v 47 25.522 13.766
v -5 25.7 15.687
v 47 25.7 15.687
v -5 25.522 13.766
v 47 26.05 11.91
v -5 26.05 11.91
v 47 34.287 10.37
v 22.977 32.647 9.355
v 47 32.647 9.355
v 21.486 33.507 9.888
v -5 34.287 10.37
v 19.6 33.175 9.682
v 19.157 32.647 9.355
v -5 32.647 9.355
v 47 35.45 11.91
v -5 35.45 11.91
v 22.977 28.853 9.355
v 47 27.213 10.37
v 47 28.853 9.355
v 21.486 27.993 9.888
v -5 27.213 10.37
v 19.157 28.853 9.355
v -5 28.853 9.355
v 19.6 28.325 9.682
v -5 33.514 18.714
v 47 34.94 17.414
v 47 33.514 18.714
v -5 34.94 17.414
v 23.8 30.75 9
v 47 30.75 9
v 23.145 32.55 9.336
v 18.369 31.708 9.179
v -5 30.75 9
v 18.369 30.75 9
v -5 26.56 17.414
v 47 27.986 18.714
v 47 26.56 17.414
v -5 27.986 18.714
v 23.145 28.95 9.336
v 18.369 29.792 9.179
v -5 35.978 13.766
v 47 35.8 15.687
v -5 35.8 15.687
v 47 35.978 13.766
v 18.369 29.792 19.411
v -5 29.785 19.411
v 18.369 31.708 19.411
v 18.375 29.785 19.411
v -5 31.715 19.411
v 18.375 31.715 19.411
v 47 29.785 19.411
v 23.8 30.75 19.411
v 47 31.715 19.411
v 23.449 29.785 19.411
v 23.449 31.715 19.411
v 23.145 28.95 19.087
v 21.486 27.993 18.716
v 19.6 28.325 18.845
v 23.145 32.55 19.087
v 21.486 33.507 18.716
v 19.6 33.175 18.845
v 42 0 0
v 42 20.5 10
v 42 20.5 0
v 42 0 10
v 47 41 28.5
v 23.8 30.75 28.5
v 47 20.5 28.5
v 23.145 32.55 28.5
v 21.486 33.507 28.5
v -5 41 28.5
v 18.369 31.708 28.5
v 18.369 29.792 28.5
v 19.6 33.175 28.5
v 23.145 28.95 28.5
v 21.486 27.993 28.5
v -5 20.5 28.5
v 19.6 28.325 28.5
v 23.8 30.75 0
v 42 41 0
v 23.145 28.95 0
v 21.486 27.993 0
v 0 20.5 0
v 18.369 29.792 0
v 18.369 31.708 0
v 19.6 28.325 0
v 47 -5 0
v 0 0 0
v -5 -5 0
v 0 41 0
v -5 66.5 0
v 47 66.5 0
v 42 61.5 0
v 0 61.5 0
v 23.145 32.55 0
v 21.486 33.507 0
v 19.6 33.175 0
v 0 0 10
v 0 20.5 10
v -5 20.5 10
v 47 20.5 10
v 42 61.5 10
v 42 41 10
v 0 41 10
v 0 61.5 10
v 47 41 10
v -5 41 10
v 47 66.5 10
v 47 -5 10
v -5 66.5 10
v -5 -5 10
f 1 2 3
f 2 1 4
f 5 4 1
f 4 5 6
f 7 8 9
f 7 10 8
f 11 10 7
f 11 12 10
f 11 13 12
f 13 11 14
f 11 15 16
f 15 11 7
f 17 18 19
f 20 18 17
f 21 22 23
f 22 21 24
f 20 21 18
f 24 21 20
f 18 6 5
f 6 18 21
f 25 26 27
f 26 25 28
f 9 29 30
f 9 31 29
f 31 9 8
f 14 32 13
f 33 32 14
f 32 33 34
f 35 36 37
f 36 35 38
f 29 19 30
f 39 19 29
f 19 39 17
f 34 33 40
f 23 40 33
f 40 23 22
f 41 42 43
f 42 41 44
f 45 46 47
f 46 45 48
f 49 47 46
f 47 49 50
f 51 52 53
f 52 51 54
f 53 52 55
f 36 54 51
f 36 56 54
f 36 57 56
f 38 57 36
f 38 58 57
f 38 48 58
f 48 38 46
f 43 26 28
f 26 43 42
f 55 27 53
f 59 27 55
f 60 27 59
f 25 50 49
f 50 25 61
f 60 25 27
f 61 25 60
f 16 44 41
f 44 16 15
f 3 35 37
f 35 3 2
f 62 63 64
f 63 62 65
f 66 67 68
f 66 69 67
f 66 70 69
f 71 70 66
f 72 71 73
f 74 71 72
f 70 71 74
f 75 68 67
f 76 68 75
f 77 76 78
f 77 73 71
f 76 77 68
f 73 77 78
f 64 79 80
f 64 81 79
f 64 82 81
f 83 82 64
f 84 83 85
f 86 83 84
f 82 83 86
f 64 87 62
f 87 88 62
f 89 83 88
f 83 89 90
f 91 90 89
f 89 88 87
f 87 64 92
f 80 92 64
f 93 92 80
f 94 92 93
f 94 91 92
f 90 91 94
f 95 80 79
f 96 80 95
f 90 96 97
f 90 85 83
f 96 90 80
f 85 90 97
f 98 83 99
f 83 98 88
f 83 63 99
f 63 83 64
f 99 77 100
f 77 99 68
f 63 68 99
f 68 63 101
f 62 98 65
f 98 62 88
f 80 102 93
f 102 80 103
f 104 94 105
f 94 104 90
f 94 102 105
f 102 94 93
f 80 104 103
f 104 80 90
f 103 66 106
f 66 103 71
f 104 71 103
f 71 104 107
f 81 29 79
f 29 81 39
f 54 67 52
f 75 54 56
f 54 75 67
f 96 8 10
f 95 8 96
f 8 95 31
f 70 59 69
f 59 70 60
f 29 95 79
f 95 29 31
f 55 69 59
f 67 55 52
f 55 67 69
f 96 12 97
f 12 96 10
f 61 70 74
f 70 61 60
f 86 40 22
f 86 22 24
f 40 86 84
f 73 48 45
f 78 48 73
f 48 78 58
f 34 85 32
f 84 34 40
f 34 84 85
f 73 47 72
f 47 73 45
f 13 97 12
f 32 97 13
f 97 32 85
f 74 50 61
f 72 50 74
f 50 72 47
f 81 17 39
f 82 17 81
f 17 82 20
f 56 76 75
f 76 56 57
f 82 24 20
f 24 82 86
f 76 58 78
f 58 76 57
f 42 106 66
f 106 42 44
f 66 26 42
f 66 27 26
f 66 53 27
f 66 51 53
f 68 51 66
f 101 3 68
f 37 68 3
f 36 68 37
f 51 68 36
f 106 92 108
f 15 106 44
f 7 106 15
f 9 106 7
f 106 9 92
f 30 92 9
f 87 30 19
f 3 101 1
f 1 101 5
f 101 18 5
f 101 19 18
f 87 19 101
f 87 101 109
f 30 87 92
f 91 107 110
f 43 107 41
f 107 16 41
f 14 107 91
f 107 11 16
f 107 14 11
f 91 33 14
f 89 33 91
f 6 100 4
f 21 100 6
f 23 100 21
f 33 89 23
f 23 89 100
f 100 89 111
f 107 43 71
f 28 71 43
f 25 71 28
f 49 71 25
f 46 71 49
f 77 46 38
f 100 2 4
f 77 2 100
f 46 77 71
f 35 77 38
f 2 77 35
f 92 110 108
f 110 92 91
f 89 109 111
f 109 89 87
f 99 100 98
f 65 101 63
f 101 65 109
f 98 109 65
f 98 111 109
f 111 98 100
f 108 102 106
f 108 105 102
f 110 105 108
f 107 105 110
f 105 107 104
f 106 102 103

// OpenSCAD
//-- Servo Tray for Carbon Fibre Rod
//-- Mrhamer.com
//-- GPL V3
servowidth= 20.5 ;
servoheight= 28.5 ;
servolength= 42 ;
fuselog = 10.5 ; 
internalbuffer =  5;
outsidebuffer = 5;
gap = servowidth + fuselog;

//Bracket


difference(){
translate([-outsidebuffer,-outsidebuffer,0])cube([servolength+outsidebuffer+outsidebuffer, servowidth+internalbuffer+fuselog+internalbuffer+servowidth+outsidebuffer+outsidebuffer, servoheight]);

//Removal
union(){
translate([0, servowidth + internalbuffer + (fuselog/2),servoheight/2])translate([-20,0,0])rotate(90,[0,1,0])cylinder(r=fuselog/2, h=servolength+50);
cube([42,servowidth,28.5]) ;
translate([0,gap+internalbuffer+internalbuffer,0])cube([42,servowidth,28.5]) ;
translate([servolength/2, servowidth + internalbuffer + (fuselog/2),-11])cylinder(r=2.8, 50);}
translate([-outsidebuffer,-outsidebuffer,10])cube([outsidebuffer+outsidebuffer+servolength,servowidth+outsidebuffer,servoheight-10]) ;
translate([-outsidebuffer,servowidth + fuselog + internalbuffer+ internalbuffer, 10])cube([outsidebuffer+outsidebuffer+servolength,servowidth+outsidebuffer,servoheight-10]) ;

}
